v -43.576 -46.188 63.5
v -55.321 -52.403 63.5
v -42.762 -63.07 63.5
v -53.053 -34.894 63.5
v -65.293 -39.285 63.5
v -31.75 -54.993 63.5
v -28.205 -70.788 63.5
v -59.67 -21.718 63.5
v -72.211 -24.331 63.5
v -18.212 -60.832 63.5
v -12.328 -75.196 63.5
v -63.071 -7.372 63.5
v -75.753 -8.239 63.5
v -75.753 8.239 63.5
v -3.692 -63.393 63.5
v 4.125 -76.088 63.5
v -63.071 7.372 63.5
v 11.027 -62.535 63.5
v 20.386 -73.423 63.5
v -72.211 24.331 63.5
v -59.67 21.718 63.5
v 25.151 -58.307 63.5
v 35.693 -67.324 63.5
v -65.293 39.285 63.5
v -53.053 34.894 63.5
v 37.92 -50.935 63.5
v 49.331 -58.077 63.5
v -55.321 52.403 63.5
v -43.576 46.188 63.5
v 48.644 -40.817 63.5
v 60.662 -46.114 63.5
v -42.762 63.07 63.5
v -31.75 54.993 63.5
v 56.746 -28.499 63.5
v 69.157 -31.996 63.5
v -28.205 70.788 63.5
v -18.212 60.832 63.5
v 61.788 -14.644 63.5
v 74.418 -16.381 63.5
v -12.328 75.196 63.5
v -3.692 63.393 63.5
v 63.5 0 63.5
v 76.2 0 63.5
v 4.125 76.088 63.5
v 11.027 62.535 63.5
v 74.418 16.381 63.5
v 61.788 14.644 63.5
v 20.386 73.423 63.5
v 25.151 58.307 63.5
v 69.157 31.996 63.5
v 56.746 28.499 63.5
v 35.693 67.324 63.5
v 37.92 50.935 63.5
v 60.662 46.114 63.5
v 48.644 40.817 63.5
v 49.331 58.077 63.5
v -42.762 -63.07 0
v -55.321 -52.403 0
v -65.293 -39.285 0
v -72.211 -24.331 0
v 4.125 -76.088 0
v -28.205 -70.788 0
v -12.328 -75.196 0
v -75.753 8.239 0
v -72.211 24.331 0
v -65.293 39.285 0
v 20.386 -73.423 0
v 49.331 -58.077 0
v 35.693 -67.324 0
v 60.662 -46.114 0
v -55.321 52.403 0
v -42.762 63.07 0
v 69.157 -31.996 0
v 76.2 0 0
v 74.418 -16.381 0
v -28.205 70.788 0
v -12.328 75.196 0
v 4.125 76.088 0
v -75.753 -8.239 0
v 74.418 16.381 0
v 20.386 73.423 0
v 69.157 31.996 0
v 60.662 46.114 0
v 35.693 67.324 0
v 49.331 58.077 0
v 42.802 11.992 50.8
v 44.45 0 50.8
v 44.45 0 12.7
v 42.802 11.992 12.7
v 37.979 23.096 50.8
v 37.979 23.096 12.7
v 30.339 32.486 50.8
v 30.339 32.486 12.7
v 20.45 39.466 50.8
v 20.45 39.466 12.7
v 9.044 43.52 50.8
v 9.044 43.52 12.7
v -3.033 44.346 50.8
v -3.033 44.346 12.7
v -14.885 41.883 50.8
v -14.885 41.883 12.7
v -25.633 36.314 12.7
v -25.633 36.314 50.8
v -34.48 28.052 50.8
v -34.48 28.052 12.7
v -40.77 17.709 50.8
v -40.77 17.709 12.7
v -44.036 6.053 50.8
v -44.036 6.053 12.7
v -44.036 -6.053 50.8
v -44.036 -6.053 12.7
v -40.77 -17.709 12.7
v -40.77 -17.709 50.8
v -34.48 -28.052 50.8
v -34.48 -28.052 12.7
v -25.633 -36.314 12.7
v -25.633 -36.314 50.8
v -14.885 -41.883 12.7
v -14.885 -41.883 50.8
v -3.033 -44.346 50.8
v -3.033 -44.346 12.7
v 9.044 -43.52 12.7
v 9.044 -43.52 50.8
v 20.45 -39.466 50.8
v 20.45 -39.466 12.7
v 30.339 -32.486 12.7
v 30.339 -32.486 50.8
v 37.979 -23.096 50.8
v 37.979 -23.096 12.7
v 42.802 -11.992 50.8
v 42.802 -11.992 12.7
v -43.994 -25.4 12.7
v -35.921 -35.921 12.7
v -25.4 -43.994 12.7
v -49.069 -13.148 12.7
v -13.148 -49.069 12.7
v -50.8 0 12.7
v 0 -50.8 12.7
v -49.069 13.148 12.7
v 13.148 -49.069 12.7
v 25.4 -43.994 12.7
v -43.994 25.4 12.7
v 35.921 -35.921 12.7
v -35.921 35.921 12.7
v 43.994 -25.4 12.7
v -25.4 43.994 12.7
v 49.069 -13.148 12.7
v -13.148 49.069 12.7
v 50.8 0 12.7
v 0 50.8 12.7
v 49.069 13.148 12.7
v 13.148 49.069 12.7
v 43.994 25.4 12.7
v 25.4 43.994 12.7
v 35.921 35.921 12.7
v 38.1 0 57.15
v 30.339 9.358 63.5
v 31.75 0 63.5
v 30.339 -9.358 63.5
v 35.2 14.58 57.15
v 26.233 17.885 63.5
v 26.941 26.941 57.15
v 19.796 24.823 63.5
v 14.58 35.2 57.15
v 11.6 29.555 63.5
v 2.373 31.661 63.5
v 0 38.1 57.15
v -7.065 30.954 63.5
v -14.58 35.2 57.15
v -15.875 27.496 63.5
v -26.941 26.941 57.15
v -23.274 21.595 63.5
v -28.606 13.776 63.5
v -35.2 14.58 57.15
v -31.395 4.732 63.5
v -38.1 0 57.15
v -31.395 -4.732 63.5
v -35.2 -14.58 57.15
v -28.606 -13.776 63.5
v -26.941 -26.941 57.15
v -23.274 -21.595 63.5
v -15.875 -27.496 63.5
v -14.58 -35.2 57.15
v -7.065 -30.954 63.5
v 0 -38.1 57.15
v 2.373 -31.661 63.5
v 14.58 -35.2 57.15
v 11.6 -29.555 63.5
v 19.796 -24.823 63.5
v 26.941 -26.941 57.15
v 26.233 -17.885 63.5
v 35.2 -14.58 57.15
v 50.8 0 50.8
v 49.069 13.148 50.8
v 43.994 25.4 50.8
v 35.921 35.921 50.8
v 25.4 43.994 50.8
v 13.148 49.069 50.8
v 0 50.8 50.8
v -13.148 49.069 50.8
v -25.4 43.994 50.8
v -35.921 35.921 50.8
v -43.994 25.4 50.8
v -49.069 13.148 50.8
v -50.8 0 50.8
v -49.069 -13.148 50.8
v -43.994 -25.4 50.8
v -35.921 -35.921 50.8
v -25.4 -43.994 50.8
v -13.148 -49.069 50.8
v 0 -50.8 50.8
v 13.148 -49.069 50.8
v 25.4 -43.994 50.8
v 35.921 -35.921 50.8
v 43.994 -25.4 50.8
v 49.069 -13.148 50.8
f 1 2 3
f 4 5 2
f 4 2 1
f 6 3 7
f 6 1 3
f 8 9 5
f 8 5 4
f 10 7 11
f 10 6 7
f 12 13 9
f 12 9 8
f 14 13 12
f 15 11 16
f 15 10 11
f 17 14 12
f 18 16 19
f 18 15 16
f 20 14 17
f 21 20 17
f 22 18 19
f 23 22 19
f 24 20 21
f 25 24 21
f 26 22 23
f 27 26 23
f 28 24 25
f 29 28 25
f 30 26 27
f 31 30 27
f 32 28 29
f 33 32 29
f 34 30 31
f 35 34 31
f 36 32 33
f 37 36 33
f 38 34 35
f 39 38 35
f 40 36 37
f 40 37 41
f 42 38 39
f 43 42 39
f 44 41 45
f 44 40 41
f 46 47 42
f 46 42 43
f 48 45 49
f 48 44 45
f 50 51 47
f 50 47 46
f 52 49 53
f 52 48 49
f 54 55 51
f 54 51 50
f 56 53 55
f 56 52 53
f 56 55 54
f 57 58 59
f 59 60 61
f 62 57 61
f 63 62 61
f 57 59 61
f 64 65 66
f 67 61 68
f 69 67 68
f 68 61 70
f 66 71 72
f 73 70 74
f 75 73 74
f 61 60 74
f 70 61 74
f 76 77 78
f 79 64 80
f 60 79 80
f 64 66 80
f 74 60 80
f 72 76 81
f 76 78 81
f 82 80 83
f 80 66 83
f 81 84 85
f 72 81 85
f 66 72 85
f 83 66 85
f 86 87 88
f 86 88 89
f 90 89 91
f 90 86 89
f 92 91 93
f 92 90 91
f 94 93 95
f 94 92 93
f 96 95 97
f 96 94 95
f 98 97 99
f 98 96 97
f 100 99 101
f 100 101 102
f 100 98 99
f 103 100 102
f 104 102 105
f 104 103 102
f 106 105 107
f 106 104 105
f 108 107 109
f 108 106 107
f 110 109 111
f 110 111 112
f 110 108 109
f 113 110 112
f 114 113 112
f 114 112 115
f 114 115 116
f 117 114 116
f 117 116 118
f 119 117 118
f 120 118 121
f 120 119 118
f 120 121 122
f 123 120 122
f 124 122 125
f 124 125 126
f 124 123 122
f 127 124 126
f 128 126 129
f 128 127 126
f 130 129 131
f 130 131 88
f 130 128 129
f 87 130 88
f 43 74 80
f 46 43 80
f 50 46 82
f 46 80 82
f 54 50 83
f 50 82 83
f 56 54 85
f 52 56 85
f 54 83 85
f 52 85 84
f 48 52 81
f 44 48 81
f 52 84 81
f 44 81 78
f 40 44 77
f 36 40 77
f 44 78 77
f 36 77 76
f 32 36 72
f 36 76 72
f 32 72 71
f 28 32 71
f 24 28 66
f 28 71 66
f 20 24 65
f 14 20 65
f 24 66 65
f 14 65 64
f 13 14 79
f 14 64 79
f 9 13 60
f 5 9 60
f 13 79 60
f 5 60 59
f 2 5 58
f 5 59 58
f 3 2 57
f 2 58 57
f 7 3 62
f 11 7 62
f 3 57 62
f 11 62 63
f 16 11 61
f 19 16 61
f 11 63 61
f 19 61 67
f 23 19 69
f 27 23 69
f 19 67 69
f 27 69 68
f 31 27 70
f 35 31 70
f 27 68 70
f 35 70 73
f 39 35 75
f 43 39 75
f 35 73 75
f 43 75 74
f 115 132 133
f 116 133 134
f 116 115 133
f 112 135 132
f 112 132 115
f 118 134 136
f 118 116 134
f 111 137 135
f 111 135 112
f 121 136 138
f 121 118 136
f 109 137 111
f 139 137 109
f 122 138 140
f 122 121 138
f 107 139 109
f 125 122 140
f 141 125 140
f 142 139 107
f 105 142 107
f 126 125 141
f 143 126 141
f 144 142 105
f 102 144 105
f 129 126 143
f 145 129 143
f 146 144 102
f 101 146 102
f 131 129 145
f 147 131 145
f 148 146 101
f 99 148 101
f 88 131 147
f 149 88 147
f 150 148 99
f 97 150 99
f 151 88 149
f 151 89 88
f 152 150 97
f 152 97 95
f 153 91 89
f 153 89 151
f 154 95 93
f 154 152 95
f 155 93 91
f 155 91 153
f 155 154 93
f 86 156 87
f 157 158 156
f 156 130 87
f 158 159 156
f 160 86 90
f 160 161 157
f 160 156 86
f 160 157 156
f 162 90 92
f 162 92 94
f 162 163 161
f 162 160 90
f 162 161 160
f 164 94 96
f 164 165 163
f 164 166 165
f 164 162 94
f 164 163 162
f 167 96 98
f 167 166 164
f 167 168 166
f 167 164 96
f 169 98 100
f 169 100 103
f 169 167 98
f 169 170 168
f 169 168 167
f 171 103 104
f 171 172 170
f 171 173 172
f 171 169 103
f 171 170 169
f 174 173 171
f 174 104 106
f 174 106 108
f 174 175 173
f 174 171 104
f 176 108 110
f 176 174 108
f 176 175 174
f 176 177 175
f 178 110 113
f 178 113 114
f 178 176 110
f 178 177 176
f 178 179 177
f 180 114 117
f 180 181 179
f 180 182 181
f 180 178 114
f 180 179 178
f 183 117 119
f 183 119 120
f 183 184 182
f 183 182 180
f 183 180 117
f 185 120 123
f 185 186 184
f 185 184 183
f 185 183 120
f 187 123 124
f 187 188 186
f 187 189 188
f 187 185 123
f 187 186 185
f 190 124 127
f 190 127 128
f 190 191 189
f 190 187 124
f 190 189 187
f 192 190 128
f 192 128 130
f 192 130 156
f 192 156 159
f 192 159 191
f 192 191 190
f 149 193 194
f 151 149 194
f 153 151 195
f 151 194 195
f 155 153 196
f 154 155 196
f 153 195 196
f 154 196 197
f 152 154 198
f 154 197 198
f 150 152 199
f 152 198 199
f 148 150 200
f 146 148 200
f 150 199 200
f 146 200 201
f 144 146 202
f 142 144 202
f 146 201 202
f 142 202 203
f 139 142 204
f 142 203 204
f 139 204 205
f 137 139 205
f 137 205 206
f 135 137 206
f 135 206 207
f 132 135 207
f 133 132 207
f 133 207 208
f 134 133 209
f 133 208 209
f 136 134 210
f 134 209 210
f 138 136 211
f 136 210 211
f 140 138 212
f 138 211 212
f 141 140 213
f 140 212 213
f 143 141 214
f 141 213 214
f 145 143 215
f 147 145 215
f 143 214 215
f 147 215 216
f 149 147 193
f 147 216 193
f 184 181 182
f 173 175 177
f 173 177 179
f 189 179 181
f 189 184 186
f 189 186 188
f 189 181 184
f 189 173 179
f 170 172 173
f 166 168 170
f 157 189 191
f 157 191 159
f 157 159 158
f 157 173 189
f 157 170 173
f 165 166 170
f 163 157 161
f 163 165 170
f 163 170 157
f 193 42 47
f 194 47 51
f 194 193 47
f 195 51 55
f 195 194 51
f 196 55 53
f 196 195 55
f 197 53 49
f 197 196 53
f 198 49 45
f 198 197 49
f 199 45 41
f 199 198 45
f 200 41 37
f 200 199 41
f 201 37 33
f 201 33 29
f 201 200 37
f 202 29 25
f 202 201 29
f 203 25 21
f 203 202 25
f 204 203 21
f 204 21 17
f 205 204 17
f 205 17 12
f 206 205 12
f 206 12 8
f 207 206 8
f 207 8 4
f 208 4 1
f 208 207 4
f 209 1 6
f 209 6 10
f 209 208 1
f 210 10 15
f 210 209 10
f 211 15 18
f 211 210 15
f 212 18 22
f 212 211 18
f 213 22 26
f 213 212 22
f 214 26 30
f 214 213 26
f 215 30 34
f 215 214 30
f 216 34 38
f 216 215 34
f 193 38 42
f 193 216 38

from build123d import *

# Parameters (mm, degrees)
F0_R     = 76.2
F1_DEPTH = 63.5
F2_R     = 50.8
F2_R_2   = 44.45
F3_DEPTH = 50.8
F4_SIZE  = 12.7


with BuildPart() as f1:
    # F0 (on Top) → F1 (new body)
    with BuildSketch(Plane.XY):
        Circle(F0_R)
    extrude(amount=F1_DEPTH)

    # F2 (on face) → F3 (cut)
    with BuildSketch(Plane.XY.offset(63.5)):
        Circle(F2_R)
        Circle(F2_R_2, mode=Mode.SUBTRACT)
    extrude(amount=-F3_DEPTH, mode=Mode.SUBTRACT)

    # F4
    f4_edges = [f1.edges().sort_by_distance(p)[0] for p in [
        (-50.8, 0, 63.5),
        (-44.45, 0, 63.5),
    ]]
    chamfer(f4_edges, length=F4_SIZE)


solid = f1.part
